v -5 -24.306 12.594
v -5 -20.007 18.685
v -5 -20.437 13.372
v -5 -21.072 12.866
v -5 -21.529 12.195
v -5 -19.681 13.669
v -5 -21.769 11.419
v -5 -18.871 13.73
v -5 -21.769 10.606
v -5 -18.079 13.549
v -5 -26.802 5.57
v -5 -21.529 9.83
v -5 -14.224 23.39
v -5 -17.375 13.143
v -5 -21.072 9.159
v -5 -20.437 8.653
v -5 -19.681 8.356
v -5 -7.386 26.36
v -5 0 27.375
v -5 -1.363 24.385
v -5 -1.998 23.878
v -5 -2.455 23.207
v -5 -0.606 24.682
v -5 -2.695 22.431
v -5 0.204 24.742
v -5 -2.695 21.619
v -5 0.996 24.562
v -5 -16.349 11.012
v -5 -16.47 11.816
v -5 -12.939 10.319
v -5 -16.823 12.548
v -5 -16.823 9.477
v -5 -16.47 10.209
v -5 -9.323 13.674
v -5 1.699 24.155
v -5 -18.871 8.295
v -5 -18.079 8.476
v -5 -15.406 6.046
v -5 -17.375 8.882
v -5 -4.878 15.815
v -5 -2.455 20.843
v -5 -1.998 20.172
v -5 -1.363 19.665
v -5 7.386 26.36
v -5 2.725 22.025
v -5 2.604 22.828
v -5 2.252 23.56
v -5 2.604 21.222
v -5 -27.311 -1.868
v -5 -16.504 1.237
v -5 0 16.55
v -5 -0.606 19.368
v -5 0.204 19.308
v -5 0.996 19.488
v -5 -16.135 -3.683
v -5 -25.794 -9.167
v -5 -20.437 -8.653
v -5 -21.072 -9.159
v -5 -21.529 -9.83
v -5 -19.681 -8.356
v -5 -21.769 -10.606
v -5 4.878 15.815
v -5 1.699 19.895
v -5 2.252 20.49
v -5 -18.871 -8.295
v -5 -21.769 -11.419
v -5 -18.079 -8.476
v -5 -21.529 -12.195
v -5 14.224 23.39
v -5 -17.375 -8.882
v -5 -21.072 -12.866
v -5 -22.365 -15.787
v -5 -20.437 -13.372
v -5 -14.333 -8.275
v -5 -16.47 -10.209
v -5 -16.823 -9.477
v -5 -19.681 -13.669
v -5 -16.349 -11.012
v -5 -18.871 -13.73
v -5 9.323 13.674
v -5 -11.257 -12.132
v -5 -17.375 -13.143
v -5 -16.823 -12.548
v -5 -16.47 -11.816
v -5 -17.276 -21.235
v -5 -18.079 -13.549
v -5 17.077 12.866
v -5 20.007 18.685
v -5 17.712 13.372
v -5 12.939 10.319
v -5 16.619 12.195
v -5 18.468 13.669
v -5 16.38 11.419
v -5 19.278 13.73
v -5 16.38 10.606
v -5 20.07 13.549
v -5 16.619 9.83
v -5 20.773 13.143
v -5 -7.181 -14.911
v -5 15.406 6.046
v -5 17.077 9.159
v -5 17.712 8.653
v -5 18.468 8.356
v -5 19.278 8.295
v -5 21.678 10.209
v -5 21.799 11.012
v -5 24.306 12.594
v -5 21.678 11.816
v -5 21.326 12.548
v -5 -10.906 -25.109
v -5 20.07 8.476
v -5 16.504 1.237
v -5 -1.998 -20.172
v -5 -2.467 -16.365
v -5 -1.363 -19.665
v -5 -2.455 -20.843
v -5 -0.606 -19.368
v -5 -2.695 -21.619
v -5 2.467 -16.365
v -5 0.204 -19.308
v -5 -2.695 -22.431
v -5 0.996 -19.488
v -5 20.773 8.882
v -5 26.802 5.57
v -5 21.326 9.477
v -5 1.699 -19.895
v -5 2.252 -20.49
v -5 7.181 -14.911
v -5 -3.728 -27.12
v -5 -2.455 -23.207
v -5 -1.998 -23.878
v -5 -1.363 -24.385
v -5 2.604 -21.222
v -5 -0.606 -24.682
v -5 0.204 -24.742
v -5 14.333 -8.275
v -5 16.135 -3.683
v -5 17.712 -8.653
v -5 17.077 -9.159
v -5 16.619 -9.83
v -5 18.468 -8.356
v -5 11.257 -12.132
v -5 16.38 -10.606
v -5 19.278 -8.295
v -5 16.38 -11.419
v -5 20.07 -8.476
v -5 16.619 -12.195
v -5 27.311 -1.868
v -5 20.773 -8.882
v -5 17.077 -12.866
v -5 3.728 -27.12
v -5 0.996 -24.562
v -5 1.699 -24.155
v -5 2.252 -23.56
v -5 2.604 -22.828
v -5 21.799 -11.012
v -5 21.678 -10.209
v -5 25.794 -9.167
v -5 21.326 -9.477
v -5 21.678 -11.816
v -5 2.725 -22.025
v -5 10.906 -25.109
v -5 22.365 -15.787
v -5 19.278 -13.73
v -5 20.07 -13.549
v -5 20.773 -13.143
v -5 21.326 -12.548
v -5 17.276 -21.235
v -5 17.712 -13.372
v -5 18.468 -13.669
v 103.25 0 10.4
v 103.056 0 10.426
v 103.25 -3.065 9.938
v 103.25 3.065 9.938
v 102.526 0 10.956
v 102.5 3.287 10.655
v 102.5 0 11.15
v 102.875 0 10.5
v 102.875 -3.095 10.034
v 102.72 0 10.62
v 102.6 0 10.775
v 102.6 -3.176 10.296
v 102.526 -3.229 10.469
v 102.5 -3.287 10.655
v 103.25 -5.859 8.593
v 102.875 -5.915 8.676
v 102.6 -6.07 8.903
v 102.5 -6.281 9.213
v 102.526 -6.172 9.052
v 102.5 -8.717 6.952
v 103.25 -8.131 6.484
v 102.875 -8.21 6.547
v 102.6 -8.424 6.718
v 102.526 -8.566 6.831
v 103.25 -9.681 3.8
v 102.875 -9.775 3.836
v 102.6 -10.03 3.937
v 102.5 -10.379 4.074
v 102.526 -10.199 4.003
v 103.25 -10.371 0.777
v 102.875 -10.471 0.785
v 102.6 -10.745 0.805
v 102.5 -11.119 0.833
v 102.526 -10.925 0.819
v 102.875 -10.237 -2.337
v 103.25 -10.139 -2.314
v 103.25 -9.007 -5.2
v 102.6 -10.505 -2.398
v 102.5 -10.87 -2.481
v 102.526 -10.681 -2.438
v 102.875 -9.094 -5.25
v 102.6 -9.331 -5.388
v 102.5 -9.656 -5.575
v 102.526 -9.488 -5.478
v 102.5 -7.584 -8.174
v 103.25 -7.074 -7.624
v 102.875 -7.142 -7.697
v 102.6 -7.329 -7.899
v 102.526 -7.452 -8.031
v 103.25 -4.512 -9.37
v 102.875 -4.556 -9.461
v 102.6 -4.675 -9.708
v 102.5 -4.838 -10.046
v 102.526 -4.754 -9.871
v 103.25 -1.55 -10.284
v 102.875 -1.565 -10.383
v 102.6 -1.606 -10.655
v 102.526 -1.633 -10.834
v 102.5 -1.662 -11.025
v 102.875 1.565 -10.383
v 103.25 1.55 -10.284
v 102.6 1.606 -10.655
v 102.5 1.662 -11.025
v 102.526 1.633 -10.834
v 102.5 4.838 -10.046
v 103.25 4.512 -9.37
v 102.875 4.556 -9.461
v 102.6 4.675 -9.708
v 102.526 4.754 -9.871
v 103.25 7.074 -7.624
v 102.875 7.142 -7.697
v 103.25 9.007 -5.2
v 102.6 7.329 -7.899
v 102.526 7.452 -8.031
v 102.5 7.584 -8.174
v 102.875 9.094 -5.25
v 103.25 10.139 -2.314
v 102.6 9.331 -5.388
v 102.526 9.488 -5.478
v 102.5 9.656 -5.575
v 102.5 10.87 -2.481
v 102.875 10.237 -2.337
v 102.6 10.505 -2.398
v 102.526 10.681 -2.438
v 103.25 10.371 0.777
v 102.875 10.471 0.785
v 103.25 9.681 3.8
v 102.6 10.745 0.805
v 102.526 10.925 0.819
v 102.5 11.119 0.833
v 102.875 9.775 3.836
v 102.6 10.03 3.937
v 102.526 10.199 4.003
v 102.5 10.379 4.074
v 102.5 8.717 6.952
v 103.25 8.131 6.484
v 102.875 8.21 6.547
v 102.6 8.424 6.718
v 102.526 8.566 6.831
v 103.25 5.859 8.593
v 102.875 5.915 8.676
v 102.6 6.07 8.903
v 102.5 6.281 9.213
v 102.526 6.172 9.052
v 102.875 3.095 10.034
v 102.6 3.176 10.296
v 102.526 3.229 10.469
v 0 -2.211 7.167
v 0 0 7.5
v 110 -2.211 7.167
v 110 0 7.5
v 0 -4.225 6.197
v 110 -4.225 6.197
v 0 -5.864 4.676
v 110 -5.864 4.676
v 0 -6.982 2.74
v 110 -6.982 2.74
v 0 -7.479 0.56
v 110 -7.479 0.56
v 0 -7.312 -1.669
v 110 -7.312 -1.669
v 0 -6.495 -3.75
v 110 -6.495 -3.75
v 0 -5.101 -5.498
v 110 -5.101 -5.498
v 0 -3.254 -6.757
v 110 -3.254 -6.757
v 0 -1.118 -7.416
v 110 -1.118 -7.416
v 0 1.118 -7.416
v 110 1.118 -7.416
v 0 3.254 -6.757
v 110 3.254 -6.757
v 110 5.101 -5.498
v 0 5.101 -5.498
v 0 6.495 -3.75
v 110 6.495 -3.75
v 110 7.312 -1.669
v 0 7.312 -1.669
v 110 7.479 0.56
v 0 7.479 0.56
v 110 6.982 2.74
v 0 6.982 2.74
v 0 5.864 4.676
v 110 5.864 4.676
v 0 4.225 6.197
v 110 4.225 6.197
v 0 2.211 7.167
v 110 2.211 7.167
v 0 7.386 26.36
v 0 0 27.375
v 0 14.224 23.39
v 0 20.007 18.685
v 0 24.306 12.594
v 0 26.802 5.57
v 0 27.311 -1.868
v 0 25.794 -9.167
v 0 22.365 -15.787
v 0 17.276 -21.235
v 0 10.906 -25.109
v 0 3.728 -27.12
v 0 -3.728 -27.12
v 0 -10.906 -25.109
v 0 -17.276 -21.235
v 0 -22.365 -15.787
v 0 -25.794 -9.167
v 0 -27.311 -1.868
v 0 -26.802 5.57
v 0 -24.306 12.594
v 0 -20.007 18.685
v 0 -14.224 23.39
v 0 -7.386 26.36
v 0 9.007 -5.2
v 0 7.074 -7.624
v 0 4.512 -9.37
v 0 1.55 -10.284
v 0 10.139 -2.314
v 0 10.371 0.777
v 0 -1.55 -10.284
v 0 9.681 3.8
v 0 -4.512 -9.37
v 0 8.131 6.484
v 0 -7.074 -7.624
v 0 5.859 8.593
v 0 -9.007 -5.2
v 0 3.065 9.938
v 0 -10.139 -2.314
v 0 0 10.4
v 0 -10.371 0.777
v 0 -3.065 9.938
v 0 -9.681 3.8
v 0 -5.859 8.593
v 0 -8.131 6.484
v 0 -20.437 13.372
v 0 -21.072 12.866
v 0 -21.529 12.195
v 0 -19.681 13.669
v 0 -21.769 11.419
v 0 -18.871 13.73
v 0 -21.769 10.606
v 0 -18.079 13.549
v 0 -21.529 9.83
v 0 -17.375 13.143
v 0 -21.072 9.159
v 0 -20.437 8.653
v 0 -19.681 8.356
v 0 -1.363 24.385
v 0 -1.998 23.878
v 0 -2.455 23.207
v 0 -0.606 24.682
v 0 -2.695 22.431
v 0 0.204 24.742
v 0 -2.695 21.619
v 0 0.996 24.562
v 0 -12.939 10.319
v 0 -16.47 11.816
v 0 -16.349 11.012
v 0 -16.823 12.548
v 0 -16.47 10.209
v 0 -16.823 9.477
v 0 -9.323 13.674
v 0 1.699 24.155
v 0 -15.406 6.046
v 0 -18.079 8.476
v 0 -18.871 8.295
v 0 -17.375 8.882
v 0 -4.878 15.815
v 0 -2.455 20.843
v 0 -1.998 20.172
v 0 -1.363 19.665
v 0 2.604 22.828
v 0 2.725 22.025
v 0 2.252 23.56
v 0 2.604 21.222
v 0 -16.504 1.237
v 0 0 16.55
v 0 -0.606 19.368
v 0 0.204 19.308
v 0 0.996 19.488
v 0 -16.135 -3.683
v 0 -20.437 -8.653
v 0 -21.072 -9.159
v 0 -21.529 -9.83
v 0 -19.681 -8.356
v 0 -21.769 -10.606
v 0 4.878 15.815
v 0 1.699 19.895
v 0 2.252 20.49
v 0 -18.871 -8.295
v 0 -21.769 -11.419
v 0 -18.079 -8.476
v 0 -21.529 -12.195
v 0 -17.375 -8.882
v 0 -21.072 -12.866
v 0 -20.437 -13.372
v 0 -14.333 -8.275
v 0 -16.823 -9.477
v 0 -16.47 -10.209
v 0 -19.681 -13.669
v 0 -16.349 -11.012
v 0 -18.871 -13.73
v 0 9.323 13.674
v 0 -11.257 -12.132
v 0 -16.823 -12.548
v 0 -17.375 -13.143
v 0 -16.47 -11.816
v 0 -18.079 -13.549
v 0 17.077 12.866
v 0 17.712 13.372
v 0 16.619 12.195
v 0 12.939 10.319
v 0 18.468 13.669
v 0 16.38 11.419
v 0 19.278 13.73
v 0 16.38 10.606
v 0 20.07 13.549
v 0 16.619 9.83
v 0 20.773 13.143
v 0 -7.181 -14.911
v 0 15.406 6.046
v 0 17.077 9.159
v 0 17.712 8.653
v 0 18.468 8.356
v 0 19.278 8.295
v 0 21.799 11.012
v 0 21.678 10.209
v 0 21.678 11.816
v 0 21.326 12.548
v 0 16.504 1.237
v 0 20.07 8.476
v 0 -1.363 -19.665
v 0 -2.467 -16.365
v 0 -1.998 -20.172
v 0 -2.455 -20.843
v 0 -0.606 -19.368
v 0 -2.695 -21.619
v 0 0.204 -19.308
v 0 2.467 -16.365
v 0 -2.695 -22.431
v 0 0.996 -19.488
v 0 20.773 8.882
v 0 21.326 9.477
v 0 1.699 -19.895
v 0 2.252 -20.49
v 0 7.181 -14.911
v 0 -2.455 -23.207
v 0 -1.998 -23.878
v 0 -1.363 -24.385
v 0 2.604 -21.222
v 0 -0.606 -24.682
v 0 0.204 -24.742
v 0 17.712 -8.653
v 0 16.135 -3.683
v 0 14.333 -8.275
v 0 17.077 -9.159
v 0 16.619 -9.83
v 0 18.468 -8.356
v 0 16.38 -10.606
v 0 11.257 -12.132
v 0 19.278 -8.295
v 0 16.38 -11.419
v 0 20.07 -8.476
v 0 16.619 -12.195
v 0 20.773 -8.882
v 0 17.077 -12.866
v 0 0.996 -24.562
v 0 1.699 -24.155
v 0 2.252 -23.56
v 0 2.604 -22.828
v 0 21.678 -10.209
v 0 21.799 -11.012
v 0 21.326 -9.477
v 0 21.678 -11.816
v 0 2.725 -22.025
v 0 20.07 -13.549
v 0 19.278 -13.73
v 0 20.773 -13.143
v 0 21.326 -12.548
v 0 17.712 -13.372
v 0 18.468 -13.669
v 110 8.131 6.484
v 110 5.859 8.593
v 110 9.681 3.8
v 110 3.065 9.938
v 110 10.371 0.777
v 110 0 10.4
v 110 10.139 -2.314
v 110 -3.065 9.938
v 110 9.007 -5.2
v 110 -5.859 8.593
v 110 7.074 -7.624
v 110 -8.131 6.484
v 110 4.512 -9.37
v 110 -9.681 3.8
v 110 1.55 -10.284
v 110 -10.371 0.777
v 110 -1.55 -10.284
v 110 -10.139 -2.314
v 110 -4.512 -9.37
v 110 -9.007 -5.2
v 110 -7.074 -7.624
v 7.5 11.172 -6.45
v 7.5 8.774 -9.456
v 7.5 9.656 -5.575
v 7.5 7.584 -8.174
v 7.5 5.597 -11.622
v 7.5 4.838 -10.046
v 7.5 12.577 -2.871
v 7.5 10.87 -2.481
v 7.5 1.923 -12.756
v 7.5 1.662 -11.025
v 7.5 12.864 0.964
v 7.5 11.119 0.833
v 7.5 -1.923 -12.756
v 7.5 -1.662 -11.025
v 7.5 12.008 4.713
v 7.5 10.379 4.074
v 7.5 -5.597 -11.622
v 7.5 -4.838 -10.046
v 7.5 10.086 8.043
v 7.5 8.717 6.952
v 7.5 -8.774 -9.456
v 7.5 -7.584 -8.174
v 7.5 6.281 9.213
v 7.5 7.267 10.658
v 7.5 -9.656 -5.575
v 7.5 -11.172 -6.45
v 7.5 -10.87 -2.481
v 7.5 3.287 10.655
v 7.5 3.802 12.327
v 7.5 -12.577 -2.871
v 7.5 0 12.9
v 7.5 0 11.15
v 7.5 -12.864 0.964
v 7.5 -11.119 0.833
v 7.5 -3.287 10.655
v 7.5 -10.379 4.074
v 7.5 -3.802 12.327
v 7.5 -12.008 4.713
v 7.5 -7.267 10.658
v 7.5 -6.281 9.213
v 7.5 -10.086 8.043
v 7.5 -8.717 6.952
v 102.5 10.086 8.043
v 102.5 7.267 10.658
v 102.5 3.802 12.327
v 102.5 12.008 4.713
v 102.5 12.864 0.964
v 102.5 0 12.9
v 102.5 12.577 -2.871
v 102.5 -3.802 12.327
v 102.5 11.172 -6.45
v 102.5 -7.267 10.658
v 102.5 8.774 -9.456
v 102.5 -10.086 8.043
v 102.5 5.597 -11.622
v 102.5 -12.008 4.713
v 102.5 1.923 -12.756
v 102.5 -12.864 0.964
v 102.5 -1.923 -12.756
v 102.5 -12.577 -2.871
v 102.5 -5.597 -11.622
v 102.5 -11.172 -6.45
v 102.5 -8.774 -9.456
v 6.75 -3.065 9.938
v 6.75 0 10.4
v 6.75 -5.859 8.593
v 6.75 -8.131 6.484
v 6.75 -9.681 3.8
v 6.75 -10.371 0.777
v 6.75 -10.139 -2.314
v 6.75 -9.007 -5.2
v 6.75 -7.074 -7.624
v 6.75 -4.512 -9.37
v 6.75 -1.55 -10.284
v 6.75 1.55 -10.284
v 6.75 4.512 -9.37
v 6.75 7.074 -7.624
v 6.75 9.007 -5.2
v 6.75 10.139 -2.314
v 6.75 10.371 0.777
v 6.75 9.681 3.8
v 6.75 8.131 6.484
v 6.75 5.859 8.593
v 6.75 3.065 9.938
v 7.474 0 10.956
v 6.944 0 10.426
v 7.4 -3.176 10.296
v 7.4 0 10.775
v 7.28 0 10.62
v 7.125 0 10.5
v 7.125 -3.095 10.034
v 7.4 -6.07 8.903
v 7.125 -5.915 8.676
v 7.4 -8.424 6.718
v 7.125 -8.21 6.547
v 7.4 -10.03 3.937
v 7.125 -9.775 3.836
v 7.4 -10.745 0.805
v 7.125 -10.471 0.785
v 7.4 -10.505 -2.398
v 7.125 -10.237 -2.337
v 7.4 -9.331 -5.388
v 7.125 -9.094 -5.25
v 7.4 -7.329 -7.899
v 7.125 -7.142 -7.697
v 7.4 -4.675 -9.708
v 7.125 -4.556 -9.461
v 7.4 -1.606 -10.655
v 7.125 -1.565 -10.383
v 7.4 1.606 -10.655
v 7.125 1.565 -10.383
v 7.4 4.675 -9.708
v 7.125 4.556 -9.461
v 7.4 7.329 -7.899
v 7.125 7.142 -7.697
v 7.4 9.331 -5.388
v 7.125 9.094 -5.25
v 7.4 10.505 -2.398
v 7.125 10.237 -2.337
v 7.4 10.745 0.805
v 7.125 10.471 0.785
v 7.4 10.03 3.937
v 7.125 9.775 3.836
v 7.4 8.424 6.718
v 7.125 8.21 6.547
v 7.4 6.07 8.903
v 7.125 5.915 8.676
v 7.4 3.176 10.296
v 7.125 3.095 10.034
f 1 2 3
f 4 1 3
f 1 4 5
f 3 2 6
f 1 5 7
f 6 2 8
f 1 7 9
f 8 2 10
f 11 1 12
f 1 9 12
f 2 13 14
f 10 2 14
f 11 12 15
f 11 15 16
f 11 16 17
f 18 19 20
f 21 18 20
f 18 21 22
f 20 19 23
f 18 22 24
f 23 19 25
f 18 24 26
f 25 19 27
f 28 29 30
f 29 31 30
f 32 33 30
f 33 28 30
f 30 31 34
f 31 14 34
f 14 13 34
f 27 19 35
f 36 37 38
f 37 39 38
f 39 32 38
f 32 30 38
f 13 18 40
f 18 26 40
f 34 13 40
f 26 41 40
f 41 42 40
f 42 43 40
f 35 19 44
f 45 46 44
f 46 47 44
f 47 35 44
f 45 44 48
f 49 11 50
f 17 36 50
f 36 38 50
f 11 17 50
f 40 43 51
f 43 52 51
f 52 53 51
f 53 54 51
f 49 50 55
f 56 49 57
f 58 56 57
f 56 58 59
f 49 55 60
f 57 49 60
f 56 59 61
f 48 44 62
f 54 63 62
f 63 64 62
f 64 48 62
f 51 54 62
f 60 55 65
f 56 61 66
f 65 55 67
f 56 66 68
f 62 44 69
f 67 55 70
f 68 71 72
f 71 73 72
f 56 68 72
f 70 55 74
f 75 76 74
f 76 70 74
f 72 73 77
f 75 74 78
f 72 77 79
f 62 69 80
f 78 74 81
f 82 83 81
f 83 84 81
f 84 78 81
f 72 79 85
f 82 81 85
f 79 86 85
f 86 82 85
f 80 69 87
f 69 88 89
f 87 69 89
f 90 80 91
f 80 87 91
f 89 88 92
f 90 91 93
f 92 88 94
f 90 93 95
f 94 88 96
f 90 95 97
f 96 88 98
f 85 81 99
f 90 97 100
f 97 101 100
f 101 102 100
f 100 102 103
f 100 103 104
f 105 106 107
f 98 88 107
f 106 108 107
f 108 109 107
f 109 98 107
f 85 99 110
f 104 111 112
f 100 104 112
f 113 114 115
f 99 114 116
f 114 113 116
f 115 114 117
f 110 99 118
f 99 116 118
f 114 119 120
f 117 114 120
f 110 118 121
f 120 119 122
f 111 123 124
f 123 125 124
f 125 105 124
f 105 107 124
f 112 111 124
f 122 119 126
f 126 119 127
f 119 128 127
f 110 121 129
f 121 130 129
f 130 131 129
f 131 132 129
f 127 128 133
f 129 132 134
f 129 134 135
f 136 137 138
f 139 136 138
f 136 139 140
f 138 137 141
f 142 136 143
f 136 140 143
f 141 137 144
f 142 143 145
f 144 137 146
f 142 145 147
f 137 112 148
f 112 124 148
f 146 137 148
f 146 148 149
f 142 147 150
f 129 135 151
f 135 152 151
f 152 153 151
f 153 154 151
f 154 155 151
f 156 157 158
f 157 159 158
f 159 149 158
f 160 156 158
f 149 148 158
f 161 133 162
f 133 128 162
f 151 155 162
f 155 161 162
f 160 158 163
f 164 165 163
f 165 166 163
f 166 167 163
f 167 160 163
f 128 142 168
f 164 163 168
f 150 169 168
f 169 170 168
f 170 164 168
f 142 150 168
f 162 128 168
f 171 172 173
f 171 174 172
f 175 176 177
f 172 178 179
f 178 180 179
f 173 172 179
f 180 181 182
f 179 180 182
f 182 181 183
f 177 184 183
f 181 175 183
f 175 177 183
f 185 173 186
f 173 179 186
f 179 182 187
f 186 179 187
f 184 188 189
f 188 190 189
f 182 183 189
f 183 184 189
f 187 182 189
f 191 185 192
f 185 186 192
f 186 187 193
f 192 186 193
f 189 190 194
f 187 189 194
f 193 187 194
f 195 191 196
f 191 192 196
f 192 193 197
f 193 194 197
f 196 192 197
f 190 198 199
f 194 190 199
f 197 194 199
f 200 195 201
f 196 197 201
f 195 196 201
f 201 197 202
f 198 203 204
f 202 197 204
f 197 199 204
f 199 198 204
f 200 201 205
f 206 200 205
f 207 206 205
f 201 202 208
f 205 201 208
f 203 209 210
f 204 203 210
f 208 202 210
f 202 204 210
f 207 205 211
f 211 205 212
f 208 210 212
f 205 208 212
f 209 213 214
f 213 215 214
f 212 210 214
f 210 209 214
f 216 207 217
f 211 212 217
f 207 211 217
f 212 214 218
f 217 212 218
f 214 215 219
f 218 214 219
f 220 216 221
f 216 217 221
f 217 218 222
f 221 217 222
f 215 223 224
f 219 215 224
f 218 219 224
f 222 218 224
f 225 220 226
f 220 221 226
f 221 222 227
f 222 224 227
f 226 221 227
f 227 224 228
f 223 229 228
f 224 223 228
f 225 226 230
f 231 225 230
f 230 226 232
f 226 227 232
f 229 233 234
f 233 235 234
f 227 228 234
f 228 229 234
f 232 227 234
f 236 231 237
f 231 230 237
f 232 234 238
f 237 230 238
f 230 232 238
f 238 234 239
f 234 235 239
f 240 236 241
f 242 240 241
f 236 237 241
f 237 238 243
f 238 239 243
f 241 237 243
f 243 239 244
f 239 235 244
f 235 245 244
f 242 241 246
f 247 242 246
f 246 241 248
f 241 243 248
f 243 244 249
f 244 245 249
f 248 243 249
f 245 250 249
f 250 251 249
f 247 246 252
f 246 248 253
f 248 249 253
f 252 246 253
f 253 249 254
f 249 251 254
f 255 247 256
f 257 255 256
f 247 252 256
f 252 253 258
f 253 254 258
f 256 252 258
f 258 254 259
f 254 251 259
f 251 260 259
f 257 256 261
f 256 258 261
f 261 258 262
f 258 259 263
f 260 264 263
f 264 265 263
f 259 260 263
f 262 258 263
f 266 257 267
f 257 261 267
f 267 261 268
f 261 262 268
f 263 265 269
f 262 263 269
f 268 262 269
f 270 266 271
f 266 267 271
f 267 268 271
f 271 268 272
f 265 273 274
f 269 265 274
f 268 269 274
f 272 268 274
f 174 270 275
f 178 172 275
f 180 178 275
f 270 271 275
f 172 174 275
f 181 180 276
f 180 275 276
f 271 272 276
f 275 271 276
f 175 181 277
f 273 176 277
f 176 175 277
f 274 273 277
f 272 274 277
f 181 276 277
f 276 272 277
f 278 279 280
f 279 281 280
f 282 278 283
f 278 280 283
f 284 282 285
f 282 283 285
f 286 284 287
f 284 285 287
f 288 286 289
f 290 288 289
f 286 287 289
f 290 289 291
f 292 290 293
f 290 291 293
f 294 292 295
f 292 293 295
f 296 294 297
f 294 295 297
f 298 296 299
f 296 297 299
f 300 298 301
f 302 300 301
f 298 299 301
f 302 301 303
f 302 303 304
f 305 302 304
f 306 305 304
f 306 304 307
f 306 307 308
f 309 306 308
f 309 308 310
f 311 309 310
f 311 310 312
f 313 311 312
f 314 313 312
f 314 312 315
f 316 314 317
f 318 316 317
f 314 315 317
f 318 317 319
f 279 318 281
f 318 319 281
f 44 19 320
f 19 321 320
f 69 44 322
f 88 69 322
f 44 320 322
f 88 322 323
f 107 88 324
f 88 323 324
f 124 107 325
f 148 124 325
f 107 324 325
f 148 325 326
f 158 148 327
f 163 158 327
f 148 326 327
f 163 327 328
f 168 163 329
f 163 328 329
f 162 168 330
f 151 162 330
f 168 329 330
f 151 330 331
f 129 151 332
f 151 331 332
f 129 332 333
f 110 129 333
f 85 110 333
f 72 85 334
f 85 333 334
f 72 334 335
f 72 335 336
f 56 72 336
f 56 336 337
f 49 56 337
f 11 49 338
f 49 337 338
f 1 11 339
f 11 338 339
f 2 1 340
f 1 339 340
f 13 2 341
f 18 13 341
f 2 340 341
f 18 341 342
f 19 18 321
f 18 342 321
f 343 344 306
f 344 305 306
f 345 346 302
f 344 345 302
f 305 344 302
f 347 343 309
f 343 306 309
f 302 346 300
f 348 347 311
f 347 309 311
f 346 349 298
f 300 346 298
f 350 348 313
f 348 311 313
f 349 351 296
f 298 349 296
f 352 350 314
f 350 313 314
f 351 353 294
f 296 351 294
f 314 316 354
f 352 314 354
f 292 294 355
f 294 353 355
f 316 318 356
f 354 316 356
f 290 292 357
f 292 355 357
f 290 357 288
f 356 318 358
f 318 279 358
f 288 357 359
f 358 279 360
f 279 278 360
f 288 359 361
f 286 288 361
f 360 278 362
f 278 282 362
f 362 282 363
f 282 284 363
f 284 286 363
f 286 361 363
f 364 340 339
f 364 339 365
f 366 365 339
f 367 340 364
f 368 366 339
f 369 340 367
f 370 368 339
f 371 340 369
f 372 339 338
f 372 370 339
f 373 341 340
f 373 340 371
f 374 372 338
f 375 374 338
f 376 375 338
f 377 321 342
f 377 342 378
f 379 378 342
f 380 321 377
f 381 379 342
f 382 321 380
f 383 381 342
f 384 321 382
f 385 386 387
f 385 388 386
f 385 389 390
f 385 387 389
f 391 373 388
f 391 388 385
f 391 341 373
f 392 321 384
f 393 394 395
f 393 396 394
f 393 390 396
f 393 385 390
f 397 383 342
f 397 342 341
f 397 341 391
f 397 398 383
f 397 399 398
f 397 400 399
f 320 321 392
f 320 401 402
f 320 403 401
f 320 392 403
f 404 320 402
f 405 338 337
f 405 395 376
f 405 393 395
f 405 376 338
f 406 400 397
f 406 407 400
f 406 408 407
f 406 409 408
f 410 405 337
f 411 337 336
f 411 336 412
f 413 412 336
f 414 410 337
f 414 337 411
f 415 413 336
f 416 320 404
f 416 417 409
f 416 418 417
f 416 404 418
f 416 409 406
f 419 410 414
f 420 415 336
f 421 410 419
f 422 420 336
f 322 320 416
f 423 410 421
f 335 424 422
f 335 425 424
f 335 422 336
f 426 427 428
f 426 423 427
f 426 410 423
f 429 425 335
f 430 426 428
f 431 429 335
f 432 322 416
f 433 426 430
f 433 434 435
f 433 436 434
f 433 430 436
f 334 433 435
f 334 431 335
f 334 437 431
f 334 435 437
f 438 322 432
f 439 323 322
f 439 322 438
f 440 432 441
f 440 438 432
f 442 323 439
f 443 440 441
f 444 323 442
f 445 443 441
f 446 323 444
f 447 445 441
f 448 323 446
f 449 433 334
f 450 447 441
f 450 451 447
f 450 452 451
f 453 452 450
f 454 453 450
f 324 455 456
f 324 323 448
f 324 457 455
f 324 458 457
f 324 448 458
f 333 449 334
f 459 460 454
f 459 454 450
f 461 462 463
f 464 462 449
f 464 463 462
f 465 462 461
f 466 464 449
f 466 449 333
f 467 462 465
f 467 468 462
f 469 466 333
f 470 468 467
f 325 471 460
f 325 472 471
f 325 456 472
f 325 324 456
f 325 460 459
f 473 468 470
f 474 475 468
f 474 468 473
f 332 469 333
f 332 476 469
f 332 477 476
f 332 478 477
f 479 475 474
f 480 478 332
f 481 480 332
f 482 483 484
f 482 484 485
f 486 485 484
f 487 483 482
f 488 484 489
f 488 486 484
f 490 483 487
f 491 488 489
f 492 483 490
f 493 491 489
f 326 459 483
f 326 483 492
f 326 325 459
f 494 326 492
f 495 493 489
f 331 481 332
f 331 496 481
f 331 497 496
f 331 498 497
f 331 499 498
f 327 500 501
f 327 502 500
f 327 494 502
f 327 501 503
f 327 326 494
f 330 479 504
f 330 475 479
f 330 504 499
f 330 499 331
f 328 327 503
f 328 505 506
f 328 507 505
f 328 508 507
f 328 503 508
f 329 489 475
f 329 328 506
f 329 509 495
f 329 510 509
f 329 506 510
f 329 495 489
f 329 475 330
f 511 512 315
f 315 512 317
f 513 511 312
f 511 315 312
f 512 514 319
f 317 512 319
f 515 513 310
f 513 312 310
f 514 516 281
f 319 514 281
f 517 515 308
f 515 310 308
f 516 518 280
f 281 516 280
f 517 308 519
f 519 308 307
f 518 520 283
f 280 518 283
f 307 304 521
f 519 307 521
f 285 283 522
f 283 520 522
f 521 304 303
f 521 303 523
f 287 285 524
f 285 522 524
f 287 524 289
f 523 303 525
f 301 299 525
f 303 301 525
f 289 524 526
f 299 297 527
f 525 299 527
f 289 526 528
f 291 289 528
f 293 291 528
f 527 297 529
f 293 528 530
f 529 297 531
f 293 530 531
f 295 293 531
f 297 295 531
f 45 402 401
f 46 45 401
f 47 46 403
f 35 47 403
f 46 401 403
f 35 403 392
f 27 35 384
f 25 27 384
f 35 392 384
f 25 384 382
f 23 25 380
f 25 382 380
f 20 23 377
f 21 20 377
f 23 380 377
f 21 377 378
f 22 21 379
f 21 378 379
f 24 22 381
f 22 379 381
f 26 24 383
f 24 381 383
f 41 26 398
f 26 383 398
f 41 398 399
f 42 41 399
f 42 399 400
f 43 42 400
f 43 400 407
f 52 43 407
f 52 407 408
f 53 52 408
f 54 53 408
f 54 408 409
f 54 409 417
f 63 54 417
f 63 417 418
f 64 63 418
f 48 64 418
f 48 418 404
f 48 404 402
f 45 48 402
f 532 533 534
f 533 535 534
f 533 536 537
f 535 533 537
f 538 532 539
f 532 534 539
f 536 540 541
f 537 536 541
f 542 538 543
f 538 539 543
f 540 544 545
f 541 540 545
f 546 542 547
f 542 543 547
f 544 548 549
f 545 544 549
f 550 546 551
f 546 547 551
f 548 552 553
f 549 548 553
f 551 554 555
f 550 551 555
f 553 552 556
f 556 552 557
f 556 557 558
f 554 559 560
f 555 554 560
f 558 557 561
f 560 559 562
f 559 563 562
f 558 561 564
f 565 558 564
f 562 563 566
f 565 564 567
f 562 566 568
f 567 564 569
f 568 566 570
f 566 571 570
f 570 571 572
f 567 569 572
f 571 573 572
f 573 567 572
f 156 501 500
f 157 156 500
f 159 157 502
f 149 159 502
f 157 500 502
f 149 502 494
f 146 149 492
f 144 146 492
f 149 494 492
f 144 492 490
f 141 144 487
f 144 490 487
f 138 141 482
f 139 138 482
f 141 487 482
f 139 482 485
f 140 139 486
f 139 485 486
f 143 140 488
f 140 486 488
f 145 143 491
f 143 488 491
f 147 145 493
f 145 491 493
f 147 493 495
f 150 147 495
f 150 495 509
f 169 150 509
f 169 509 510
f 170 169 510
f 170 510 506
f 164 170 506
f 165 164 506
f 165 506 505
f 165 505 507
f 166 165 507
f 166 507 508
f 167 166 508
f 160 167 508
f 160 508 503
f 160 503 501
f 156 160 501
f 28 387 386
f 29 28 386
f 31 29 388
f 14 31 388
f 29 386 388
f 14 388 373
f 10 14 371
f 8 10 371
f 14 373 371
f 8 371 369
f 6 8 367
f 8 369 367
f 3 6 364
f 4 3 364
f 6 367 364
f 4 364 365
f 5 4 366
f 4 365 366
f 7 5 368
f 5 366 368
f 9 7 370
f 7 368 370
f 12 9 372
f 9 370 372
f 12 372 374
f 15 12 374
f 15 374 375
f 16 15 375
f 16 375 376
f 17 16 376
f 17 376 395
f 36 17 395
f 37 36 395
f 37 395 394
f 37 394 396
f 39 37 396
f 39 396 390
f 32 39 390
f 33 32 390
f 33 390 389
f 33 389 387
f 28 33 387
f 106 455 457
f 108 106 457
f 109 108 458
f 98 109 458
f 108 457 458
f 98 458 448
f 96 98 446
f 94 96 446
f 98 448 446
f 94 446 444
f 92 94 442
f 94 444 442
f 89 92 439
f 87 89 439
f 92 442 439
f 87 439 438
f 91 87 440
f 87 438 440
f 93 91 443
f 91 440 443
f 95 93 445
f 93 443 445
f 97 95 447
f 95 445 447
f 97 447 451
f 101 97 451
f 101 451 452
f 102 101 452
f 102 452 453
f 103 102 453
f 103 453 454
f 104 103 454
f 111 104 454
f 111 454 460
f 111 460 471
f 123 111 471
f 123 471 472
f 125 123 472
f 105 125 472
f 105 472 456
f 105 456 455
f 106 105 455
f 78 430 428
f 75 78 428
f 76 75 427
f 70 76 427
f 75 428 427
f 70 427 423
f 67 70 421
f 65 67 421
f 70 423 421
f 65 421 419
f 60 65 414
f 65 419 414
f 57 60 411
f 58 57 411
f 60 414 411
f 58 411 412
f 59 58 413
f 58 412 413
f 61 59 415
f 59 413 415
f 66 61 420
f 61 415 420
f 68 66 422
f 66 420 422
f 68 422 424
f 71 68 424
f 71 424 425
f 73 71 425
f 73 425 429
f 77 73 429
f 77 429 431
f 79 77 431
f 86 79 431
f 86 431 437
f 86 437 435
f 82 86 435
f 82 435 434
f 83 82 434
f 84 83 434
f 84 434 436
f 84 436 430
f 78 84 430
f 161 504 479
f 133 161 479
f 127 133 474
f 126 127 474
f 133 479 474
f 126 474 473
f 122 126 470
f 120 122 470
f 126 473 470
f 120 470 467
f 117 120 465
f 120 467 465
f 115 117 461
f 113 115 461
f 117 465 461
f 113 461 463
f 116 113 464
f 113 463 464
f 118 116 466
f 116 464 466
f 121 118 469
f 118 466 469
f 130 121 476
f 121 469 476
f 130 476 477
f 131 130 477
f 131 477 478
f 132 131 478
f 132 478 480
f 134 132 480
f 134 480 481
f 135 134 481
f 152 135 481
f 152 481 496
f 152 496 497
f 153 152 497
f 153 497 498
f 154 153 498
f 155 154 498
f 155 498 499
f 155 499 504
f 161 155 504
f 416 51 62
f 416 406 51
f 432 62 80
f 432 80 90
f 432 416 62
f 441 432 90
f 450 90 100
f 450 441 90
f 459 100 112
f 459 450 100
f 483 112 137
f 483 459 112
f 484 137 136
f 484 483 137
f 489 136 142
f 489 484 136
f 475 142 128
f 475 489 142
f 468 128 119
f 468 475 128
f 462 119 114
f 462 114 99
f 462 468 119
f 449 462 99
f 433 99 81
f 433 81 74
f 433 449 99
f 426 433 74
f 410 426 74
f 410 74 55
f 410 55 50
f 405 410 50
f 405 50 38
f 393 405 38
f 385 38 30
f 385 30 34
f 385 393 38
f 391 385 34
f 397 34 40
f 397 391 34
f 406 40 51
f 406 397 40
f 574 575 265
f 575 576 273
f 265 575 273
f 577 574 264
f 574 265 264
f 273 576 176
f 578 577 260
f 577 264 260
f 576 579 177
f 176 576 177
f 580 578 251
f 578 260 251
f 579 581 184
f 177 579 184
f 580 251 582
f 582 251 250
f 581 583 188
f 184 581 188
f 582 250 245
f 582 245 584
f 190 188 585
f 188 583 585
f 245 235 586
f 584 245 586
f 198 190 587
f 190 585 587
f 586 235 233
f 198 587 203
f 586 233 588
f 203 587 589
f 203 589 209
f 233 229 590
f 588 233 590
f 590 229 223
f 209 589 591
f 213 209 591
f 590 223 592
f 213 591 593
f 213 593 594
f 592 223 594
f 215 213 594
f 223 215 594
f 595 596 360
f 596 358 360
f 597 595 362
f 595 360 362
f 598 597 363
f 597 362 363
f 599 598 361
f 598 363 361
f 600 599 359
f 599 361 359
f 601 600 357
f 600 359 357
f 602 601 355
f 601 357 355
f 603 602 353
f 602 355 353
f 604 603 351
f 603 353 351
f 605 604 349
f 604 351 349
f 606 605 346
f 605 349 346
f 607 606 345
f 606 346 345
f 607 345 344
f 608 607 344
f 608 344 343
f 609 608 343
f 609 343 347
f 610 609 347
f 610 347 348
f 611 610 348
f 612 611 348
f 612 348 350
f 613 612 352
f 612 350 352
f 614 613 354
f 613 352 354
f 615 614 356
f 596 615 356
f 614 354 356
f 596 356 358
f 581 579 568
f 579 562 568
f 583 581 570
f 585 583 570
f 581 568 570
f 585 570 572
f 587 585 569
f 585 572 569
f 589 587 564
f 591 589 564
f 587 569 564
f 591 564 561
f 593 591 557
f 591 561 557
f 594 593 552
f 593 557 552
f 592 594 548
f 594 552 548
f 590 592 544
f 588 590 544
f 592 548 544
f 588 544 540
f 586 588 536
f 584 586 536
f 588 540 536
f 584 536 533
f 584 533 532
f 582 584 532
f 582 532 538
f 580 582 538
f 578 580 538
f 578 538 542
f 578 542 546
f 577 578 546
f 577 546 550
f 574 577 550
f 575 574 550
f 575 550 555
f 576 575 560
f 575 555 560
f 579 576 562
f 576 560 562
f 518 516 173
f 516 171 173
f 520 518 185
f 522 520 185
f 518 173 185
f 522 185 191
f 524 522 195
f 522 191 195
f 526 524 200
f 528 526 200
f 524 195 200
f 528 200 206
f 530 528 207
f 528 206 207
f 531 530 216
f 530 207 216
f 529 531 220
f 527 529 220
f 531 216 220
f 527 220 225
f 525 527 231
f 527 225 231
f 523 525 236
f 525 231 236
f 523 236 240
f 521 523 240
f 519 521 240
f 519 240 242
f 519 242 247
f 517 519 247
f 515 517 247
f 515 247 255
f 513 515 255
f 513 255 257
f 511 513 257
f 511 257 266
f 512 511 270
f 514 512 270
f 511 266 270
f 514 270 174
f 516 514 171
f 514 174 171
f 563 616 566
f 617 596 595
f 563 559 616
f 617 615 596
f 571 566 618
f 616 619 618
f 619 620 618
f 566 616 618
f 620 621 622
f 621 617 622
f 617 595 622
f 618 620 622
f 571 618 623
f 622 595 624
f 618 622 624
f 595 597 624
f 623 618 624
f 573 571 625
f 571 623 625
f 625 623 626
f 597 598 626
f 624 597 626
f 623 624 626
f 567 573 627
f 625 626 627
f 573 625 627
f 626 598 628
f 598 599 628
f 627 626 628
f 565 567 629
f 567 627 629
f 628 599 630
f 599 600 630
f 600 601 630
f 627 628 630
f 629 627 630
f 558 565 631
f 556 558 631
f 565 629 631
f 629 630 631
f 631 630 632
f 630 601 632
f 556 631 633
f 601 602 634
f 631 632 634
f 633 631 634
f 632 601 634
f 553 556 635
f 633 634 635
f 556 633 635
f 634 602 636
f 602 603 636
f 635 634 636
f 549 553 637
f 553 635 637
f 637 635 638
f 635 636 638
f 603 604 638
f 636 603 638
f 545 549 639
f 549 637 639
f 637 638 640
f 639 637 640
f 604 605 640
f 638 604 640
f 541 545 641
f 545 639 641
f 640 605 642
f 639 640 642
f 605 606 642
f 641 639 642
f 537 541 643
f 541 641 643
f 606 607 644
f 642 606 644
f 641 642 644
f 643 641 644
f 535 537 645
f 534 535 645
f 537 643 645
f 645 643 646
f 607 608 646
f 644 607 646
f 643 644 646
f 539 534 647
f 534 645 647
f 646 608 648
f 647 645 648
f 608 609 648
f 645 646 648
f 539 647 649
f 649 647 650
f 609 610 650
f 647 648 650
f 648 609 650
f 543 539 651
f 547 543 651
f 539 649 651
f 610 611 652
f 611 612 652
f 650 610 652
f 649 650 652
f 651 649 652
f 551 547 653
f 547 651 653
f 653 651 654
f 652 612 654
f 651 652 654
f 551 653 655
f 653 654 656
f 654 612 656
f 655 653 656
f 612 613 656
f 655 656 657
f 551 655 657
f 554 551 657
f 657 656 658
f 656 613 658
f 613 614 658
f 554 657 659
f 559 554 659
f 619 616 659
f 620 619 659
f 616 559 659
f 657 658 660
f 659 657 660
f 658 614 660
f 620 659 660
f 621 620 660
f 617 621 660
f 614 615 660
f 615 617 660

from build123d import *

# Parameters (mm, degrees)
F0_W     = 5
F0_H     = 10.825
F2_R     = 2.725
F3_DEPTH = 25


with BuildPart() as f1:
    # F0 (on Front) → F1 (revolve)
    with BuildSketch(Plane.XZ):
        with Locations((-2.5, 21.9625)):
            Rectangle(F0_W, F0_H)
    revolve(axis=Axis((-22.936802, 0, 0), (-1, 0, 0)))

    # F2 (on Right) → F3 (cut)
    with BuildSketch(Plane.YZ):
        with Locations((0, 22.025)):
            Circle(F2_R)
        with Locations((-19.07421, 11.0125)):
            Circle(F2_R)
        with Locations((-19.07421, -11.0125)):
            Circle(F2_R)
        with Locations((0, -22.025)):
            Circle(F2_R)
        with Locations((19.07421, -11.0125)):
            Circle(F2_R)
        with Locations((19.07421, 11.0125)):
            Circle(F2_R)
    extrude(amount=-F3_DEPTH, mode=Mode.SUBTRACT)


with BuildPart() as f5:
    # F4 (on Front) → F5 (revolve)
    with BuildSketch(Plane.XZ):
        with BuildLine():
            Line((0, 10.4), (0, 7.5))
            Line((0, 7.5), (110, 7.5))
            Line((110, 7.5), (110, 10.4))
            Line((110, 10.4), (103.25, 10.4))
            ThreePointArc((103.25, 10.4), (102.71967, 10.61967), (102.5, 11.15))
            Line((102.5, 11.15), (102.5, 12.9))
            Line((102.5, 12.9), (7.5, 12.9))
            Line((7.5, 12.9), (7.5, 11.15))
            ThreePointArc((7.5, 11.15), (7.28033, 10.61967), (6.75, 10.4))
            Line((6.75, 10.4), (0, 10.4))
        make_face()
    revolve(axis=Axis((72.28097, 0, 0), (1, 0, 0)))


solid = Compound([f1.part, f5.part])
